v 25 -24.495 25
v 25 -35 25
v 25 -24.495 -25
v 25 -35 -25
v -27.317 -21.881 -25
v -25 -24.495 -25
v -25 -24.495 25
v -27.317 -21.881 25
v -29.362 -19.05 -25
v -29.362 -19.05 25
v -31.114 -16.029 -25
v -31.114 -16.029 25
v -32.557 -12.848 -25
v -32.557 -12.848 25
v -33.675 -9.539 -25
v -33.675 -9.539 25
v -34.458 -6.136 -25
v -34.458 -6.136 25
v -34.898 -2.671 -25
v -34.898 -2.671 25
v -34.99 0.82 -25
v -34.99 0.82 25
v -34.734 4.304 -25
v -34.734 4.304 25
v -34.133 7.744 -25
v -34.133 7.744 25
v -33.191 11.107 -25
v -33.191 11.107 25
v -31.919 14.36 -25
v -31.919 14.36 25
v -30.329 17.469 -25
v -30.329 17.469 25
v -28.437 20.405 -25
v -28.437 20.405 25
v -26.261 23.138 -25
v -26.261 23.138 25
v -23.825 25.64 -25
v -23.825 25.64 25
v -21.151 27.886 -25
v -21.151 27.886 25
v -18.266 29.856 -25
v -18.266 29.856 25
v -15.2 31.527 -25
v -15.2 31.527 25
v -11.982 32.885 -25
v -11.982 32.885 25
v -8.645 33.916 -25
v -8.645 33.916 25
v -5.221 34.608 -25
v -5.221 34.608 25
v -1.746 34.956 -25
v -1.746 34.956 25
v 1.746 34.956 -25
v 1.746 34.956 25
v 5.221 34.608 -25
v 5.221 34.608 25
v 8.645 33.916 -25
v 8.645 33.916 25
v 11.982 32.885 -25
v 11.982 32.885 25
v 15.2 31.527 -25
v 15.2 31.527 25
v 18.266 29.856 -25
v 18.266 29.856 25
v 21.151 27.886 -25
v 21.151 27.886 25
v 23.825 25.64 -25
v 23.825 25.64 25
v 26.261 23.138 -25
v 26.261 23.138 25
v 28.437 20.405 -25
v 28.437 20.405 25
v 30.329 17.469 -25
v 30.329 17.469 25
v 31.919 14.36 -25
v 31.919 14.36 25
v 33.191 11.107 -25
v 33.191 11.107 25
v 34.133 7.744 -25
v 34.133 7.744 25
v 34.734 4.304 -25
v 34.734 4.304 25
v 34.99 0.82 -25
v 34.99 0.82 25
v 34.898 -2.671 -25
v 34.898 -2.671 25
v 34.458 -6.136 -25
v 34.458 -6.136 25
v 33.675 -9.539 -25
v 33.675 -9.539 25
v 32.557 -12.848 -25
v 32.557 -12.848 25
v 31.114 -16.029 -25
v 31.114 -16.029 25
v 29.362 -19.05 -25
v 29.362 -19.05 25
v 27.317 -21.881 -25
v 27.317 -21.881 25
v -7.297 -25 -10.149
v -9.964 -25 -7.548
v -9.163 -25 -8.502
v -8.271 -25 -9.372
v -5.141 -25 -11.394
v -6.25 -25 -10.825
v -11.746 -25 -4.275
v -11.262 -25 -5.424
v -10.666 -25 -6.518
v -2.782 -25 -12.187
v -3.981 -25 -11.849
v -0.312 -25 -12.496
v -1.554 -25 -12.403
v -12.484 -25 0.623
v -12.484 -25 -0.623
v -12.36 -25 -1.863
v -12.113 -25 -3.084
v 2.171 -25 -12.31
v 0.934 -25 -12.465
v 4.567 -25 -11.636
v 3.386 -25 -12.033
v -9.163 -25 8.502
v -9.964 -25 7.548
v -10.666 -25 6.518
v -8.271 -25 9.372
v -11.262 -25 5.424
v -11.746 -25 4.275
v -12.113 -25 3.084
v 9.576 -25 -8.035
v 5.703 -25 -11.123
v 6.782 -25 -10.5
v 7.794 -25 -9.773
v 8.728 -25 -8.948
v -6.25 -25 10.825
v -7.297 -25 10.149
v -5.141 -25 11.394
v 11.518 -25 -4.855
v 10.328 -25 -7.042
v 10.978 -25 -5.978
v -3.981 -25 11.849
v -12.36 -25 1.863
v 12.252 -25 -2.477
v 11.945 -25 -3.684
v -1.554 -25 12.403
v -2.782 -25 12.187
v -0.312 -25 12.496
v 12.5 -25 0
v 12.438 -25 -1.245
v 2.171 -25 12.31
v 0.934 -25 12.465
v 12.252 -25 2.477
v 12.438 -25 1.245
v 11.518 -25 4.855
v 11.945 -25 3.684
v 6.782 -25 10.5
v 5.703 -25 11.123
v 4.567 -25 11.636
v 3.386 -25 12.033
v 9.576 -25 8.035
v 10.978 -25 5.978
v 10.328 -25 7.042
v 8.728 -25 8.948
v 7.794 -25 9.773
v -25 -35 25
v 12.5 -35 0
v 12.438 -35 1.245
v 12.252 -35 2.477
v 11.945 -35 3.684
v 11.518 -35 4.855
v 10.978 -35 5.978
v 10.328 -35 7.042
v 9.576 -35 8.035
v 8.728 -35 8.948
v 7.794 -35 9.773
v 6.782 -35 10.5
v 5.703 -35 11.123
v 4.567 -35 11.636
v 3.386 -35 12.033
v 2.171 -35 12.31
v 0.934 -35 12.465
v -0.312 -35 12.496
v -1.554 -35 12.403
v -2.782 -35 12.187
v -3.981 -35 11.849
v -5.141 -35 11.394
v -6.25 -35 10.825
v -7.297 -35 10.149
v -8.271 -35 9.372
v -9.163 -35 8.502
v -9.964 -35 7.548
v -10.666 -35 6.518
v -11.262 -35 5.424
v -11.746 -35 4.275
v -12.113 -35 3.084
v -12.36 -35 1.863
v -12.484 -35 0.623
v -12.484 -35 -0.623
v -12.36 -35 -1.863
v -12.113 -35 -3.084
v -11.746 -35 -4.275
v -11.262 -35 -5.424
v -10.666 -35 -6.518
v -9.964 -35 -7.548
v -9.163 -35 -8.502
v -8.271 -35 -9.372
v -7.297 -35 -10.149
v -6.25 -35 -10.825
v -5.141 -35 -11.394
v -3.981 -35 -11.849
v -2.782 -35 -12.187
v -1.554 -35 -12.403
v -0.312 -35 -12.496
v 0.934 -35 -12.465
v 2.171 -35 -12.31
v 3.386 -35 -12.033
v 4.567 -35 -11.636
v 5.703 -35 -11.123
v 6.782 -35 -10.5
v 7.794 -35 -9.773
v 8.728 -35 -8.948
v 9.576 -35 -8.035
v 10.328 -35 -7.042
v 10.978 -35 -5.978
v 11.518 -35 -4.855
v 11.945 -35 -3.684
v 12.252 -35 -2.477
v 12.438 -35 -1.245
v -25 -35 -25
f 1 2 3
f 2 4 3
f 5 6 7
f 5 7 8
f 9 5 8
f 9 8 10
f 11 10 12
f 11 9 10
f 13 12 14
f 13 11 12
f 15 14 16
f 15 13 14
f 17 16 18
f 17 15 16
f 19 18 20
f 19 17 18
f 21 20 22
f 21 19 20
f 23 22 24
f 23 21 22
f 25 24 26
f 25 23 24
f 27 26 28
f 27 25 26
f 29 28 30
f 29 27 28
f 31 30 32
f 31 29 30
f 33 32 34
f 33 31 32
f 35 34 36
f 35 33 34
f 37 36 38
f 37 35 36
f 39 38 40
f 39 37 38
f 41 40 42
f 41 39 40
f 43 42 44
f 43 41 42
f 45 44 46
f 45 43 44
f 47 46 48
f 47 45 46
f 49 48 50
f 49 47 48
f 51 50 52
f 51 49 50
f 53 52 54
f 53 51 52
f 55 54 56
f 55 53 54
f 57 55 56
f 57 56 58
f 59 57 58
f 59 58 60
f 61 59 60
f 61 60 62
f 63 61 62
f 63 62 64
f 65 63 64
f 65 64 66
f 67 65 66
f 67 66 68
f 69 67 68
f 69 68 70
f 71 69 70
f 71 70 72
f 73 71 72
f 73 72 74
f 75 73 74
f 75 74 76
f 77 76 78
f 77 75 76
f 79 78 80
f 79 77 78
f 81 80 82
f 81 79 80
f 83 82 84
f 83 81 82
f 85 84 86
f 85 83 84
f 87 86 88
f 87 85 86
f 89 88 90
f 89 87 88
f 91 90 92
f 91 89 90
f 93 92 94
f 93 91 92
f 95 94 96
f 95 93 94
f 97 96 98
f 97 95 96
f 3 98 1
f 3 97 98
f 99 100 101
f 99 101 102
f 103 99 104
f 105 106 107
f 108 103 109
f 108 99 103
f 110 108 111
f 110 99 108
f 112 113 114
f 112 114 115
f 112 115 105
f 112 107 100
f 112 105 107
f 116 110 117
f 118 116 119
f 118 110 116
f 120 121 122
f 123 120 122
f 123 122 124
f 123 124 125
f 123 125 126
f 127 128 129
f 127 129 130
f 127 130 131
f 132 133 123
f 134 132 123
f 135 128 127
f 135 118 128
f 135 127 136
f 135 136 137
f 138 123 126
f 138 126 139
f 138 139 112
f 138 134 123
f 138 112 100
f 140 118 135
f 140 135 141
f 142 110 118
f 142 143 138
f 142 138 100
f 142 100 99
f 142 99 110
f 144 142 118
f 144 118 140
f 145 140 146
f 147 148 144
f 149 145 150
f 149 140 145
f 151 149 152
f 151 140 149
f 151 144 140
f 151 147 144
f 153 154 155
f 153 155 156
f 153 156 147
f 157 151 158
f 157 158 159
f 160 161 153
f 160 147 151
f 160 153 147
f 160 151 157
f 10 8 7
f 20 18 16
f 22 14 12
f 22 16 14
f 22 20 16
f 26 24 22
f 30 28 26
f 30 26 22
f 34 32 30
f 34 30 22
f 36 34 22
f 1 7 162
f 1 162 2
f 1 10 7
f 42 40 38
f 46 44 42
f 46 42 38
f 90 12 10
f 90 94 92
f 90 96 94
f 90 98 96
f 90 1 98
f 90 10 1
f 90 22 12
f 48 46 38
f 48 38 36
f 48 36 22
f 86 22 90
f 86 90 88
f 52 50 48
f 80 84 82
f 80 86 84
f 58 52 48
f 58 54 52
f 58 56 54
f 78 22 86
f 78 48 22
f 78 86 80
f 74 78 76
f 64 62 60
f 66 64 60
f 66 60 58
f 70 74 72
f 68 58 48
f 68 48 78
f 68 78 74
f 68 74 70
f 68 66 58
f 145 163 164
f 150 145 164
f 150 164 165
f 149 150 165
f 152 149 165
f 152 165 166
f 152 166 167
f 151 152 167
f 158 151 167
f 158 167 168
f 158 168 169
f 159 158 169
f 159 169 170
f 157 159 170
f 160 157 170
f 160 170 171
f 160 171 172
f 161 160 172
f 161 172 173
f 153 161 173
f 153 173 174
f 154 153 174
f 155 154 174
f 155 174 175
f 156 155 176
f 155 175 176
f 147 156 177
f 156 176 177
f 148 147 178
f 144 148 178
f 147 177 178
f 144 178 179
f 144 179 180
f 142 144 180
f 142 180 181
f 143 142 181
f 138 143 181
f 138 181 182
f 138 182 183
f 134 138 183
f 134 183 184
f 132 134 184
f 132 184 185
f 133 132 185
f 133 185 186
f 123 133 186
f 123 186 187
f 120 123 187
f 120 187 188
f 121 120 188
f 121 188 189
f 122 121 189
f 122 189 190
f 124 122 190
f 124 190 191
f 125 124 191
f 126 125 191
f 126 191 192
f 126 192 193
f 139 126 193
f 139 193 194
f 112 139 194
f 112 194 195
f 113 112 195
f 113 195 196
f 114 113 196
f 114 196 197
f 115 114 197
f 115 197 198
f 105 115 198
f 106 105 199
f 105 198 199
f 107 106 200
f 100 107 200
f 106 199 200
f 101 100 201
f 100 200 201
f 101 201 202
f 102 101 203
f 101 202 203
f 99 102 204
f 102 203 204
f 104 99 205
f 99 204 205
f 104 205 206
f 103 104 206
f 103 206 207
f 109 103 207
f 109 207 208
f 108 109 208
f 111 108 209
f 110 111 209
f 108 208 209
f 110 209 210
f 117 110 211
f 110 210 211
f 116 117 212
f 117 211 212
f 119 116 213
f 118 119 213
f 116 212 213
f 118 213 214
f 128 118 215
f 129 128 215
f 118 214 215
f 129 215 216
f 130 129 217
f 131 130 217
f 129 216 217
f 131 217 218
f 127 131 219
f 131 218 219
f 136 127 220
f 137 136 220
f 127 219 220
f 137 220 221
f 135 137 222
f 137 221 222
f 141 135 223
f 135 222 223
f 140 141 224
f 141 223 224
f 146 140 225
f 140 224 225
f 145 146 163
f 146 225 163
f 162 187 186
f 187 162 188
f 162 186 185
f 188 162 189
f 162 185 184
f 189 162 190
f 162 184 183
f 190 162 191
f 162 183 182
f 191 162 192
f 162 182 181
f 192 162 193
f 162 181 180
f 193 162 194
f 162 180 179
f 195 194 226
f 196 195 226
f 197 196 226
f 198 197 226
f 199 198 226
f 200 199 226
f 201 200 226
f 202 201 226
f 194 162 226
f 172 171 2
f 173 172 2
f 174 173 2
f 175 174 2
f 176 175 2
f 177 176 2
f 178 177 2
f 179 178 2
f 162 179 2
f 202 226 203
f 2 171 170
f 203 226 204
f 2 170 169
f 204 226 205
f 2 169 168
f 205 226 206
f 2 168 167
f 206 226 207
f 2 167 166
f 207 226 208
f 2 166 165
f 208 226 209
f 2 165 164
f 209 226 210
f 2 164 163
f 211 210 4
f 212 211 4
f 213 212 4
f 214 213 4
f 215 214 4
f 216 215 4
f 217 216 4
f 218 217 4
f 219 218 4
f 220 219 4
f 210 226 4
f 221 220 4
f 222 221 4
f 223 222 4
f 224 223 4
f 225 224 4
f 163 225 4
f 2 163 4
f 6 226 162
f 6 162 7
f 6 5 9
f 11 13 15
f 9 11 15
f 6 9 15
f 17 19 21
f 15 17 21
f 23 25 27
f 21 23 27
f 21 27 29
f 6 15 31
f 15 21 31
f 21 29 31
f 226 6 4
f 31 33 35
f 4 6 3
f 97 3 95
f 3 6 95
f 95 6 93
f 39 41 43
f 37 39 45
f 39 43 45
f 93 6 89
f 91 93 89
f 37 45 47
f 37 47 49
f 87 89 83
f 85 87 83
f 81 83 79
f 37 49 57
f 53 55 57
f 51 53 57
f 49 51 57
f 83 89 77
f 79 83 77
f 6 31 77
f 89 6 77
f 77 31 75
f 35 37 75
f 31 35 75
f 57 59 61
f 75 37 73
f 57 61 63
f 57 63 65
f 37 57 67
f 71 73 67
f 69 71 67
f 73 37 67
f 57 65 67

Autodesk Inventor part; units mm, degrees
ref_plane "YZ Plane" through (0, 0, 0) normal (1, 0, 0) x (0, 1, 0)
ref_plane "XZ Plane" through (0, 0, 0) normal (0, 1, 0) x (-1, 0, 0)
ref_plane "XY Plane" through (0, 0, 0) normal (0, 0, 1) x (1, 0, 0)
sketch "Sketch1" plane through (0, 0, 0) normal (0, 0, 1) x (1, 0, 0)
  circle A0 centre (0, 0) radius 35
  dimension "d0" = 70
extrude "Extrusion1" add sketch "Sketch1" along normal mid plane 50
sketch "Sketch2" plane through (0, 0, 0) normal (0, 0, 1) x (1, 0, 0)
  circle A0 centre (0, 0) radius 35 projected
  line L0 (0, -35) -> (25, -35)
  line L1 (25, -35) -> (25, -24.4949)
  arc A1 (0, -35) -> (25, -24.4949) centre (0, 0) ccw
  line L2 (25, -24.4949) -> (-25, -24.4949)
  line L3 (-25, -35) -> (0, -35)
  line L4 (-25, -35) -> (-25, -24.4949)
  arc A2 (-25, -24.4949) -> (0, -35) centre (0, 0) ccw
  dimension "d3" = 25
  dimension "d6" = 25
extrude "Extrusion2" add sketch "Sketch2" along normal mid plane 50
sketch "Sketch4" plane through (-25, -35, 25) normal (0, -1, 0) x (1, 0, 0)
  circle A0 centre (25, -25) radius 12.5
  dimension "d7" = 25
extrude "Extrusion3" cut sketch "Sketch4" against normal blind 10
